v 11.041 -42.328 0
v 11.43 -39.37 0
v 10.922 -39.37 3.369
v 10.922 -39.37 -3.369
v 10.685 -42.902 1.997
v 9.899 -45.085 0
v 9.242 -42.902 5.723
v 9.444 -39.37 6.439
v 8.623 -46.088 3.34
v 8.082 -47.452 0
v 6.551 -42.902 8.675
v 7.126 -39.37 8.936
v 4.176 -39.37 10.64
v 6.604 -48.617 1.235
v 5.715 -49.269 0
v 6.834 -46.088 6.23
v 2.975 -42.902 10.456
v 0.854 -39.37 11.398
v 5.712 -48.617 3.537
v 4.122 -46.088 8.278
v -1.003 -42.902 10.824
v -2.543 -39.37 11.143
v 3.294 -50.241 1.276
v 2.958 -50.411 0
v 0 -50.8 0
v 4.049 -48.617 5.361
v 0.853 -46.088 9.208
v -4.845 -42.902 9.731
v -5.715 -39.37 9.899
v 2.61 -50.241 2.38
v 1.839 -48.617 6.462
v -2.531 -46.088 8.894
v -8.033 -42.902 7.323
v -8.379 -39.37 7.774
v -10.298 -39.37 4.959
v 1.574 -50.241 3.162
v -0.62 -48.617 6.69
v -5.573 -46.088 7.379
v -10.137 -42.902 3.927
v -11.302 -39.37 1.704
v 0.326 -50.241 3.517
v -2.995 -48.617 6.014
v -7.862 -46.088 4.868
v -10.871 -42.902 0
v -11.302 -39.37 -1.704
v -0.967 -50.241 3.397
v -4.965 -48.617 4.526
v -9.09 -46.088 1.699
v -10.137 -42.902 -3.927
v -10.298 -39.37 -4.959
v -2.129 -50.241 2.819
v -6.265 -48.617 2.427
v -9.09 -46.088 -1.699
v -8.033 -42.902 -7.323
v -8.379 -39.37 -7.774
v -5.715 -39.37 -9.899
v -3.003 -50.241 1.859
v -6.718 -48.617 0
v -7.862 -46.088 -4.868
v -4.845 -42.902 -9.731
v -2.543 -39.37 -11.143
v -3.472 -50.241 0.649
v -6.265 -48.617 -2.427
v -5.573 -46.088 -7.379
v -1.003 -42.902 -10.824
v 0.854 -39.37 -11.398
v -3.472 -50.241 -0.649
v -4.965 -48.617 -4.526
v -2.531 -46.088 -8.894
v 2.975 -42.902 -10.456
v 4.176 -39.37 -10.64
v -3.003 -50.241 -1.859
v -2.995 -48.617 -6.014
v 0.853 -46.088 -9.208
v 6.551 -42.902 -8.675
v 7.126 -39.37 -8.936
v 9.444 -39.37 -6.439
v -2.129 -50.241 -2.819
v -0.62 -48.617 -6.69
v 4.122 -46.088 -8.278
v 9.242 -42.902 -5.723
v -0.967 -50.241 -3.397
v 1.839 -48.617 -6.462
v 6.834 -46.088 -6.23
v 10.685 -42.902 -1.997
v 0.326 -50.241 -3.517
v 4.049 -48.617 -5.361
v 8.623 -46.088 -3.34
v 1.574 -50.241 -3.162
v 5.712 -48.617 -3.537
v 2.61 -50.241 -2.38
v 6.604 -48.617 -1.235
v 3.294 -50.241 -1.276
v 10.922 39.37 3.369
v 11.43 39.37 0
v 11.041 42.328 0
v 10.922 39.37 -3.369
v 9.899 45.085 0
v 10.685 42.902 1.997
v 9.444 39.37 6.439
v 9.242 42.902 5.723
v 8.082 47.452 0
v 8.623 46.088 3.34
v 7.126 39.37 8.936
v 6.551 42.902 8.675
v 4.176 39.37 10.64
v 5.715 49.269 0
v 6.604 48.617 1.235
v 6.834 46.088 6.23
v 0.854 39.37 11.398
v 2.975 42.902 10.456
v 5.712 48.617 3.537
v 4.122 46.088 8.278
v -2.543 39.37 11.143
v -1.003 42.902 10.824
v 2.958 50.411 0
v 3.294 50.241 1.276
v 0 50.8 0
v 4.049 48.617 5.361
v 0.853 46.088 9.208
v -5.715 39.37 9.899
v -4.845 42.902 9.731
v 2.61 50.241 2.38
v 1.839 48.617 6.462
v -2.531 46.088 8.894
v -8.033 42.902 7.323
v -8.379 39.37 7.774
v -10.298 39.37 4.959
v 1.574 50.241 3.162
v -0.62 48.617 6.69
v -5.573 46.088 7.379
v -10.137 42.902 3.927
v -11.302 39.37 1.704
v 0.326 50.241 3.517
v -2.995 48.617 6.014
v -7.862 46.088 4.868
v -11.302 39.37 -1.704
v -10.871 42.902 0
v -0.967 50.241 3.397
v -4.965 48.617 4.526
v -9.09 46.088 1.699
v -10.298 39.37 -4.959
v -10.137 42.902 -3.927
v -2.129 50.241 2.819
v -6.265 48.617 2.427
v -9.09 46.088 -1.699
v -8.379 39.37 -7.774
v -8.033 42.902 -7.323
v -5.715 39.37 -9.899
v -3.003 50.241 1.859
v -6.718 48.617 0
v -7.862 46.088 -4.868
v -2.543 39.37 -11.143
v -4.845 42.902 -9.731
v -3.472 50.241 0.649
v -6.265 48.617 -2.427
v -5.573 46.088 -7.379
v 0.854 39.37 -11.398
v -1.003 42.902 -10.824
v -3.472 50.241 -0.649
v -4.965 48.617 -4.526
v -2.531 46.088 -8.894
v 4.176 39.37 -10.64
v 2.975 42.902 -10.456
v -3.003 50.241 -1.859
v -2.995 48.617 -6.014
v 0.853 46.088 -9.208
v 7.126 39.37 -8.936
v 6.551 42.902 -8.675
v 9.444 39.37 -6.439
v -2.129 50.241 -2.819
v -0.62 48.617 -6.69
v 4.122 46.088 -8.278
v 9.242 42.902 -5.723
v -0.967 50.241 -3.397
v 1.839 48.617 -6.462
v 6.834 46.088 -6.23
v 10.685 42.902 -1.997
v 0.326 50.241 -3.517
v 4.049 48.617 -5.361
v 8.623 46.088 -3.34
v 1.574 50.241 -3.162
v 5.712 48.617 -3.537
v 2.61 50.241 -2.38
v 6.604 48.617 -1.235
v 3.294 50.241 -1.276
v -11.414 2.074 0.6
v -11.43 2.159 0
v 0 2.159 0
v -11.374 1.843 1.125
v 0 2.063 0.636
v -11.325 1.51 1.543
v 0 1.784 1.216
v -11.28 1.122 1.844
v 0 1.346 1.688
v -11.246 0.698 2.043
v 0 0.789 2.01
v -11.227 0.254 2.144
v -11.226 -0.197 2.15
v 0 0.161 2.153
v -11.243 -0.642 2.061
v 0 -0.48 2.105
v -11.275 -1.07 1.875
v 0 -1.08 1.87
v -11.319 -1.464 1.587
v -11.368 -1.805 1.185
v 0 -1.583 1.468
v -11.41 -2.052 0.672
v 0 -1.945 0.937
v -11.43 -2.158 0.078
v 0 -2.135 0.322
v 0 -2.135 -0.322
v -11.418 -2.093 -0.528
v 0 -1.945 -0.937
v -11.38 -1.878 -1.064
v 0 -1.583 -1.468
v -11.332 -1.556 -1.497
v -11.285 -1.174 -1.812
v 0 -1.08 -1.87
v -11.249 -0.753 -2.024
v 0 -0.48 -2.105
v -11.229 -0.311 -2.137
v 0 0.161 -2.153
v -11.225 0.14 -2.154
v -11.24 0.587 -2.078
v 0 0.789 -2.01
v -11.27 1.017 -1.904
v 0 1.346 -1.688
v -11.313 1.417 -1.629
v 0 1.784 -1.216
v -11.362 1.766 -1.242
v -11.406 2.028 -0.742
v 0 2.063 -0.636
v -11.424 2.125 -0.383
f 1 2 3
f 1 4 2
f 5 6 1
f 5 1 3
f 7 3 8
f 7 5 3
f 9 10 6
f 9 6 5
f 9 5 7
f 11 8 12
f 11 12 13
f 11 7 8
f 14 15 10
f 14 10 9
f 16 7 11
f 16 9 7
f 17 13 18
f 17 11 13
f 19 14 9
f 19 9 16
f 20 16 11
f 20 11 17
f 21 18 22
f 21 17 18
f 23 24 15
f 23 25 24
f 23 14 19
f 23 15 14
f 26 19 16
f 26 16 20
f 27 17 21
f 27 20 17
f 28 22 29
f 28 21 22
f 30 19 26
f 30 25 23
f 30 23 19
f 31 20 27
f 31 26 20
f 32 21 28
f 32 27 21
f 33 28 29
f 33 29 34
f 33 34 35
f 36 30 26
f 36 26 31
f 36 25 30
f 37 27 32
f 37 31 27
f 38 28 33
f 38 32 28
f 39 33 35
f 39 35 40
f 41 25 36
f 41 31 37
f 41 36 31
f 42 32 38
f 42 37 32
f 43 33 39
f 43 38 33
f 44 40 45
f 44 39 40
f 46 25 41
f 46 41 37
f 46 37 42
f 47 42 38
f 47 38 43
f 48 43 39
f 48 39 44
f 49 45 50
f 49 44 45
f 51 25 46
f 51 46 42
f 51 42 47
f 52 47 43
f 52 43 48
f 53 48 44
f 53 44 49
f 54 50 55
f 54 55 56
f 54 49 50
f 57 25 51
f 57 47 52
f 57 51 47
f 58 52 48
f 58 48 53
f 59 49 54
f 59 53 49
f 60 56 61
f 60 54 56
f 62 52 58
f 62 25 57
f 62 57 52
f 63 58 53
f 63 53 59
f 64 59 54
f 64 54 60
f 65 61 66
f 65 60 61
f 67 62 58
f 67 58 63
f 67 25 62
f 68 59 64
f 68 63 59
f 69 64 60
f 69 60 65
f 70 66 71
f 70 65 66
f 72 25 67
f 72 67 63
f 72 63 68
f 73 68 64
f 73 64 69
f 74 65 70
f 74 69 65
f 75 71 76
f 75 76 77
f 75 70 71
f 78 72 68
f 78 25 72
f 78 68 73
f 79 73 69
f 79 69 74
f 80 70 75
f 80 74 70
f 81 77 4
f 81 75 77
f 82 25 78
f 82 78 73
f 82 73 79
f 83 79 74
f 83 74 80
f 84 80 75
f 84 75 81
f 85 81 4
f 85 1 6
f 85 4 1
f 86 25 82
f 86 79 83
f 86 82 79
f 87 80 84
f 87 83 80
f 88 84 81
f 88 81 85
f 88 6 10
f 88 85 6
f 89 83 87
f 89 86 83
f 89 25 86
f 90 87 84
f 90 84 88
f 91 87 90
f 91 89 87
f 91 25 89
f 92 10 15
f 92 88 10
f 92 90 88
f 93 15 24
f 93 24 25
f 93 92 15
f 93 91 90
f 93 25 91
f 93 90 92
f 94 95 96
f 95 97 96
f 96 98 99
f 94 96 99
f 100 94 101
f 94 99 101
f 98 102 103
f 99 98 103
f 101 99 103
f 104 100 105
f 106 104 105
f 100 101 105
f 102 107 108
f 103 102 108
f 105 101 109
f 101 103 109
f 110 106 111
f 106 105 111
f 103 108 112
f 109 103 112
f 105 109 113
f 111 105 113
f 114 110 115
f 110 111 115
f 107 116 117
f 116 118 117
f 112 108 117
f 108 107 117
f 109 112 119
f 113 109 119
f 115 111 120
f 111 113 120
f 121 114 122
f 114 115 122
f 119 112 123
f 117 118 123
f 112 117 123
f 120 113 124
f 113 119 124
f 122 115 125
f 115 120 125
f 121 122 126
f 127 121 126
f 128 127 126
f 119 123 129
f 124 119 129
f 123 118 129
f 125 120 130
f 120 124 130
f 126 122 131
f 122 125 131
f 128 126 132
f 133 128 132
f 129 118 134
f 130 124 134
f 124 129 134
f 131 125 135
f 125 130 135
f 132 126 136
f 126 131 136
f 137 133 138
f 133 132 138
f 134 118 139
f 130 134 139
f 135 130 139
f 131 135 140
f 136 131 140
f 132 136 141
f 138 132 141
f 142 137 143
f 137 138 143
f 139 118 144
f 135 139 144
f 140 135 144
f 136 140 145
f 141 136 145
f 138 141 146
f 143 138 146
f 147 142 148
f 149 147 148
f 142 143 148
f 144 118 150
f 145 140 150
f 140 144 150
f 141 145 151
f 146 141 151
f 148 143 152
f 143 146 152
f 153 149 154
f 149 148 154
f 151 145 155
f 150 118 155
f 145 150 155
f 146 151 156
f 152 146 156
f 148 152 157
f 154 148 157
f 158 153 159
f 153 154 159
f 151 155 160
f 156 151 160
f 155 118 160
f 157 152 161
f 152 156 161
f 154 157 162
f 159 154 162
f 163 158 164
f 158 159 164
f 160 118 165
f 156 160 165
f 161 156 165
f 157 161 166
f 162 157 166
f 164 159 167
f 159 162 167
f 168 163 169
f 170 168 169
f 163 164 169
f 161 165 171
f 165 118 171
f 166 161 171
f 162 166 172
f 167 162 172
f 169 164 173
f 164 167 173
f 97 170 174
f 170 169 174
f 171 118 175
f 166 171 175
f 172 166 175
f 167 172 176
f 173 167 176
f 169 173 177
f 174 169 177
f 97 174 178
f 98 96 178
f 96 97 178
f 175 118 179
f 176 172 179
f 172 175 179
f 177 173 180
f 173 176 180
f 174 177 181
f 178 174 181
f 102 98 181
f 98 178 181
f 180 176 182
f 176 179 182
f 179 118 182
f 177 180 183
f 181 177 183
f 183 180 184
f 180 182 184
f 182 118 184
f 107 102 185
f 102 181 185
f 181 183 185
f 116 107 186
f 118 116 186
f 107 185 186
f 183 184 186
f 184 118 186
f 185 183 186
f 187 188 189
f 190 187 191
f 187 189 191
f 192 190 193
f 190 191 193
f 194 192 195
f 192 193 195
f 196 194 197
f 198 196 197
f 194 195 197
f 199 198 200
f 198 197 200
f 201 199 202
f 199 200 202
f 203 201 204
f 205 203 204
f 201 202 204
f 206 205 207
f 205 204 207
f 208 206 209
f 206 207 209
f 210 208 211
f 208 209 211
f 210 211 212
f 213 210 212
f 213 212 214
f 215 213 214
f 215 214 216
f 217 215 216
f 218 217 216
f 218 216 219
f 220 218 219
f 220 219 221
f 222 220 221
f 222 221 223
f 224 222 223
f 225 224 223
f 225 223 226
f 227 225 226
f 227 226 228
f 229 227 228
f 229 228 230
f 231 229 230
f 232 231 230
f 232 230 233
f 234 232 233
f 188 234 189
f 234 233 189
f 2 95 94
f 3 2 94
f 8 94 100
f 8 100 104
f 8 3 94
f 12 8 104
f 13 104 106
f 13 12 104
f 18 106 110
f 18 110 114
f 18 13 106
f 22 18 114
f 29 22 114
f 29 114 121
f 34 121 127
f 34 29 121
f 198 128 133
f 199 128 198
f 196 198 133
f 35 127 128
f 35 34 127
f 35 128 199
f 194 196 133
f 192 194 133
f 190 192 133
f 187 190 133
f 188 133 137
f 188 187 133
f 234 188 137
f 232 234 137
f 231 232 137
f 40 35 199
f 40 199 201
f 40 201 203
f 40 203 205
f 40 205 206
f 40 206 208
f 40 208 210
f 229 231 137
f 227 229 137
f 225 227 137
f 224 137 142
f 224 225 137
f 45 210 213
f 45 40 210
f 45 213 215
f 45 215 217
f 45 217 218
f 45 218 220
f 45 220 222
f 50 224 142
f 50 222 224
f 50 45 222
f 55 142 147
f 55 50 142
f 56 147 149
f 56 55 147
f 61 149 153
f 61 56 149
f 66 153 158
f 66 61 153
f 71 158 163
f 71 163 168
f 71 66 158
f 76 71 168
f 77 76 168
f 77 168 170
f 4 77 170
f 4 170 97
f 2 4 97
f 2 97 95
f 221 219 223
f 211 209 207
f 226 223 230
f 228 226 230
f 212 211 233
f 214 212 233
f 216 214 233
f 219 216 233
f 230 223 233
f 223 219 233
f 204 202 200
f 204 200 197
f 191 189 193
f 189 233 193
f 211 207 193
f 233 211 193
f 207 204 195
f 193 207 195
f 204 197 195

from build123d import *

# Parameters (mm, degrees)
F0_R     = 11.43
F1_DEPTH = 50.8
F2_R     = 11.43
F4_D     = 4.318
F4_DEPTH = 11.431


with BuildPart() as f1:
    # F0 (on Front) → F1 (new body, symmetric)
    with BuildSketch(Plane.XZ):
        Circle(F0_R)
    extrude(amount=F1_DEPTH, both=True)

    # F2
    f2_edges = [f1.edges().sort_by_distance(p)[0] for p in [
        (-11.43, 50.8, 0),
        (-11.43, -50.8, 0),
    ]]
    fillet(f2_edges, radius=F2_R)

    # F4 (through all, one way)
    with BuildSketch(Plane.YZ):
        with Locations((0, 0)):
            Circle(F4_D / 2)
    extrude(amount=-F4_DEPTH, mode=Mode.SUBTRACT)


solid = f1.part
